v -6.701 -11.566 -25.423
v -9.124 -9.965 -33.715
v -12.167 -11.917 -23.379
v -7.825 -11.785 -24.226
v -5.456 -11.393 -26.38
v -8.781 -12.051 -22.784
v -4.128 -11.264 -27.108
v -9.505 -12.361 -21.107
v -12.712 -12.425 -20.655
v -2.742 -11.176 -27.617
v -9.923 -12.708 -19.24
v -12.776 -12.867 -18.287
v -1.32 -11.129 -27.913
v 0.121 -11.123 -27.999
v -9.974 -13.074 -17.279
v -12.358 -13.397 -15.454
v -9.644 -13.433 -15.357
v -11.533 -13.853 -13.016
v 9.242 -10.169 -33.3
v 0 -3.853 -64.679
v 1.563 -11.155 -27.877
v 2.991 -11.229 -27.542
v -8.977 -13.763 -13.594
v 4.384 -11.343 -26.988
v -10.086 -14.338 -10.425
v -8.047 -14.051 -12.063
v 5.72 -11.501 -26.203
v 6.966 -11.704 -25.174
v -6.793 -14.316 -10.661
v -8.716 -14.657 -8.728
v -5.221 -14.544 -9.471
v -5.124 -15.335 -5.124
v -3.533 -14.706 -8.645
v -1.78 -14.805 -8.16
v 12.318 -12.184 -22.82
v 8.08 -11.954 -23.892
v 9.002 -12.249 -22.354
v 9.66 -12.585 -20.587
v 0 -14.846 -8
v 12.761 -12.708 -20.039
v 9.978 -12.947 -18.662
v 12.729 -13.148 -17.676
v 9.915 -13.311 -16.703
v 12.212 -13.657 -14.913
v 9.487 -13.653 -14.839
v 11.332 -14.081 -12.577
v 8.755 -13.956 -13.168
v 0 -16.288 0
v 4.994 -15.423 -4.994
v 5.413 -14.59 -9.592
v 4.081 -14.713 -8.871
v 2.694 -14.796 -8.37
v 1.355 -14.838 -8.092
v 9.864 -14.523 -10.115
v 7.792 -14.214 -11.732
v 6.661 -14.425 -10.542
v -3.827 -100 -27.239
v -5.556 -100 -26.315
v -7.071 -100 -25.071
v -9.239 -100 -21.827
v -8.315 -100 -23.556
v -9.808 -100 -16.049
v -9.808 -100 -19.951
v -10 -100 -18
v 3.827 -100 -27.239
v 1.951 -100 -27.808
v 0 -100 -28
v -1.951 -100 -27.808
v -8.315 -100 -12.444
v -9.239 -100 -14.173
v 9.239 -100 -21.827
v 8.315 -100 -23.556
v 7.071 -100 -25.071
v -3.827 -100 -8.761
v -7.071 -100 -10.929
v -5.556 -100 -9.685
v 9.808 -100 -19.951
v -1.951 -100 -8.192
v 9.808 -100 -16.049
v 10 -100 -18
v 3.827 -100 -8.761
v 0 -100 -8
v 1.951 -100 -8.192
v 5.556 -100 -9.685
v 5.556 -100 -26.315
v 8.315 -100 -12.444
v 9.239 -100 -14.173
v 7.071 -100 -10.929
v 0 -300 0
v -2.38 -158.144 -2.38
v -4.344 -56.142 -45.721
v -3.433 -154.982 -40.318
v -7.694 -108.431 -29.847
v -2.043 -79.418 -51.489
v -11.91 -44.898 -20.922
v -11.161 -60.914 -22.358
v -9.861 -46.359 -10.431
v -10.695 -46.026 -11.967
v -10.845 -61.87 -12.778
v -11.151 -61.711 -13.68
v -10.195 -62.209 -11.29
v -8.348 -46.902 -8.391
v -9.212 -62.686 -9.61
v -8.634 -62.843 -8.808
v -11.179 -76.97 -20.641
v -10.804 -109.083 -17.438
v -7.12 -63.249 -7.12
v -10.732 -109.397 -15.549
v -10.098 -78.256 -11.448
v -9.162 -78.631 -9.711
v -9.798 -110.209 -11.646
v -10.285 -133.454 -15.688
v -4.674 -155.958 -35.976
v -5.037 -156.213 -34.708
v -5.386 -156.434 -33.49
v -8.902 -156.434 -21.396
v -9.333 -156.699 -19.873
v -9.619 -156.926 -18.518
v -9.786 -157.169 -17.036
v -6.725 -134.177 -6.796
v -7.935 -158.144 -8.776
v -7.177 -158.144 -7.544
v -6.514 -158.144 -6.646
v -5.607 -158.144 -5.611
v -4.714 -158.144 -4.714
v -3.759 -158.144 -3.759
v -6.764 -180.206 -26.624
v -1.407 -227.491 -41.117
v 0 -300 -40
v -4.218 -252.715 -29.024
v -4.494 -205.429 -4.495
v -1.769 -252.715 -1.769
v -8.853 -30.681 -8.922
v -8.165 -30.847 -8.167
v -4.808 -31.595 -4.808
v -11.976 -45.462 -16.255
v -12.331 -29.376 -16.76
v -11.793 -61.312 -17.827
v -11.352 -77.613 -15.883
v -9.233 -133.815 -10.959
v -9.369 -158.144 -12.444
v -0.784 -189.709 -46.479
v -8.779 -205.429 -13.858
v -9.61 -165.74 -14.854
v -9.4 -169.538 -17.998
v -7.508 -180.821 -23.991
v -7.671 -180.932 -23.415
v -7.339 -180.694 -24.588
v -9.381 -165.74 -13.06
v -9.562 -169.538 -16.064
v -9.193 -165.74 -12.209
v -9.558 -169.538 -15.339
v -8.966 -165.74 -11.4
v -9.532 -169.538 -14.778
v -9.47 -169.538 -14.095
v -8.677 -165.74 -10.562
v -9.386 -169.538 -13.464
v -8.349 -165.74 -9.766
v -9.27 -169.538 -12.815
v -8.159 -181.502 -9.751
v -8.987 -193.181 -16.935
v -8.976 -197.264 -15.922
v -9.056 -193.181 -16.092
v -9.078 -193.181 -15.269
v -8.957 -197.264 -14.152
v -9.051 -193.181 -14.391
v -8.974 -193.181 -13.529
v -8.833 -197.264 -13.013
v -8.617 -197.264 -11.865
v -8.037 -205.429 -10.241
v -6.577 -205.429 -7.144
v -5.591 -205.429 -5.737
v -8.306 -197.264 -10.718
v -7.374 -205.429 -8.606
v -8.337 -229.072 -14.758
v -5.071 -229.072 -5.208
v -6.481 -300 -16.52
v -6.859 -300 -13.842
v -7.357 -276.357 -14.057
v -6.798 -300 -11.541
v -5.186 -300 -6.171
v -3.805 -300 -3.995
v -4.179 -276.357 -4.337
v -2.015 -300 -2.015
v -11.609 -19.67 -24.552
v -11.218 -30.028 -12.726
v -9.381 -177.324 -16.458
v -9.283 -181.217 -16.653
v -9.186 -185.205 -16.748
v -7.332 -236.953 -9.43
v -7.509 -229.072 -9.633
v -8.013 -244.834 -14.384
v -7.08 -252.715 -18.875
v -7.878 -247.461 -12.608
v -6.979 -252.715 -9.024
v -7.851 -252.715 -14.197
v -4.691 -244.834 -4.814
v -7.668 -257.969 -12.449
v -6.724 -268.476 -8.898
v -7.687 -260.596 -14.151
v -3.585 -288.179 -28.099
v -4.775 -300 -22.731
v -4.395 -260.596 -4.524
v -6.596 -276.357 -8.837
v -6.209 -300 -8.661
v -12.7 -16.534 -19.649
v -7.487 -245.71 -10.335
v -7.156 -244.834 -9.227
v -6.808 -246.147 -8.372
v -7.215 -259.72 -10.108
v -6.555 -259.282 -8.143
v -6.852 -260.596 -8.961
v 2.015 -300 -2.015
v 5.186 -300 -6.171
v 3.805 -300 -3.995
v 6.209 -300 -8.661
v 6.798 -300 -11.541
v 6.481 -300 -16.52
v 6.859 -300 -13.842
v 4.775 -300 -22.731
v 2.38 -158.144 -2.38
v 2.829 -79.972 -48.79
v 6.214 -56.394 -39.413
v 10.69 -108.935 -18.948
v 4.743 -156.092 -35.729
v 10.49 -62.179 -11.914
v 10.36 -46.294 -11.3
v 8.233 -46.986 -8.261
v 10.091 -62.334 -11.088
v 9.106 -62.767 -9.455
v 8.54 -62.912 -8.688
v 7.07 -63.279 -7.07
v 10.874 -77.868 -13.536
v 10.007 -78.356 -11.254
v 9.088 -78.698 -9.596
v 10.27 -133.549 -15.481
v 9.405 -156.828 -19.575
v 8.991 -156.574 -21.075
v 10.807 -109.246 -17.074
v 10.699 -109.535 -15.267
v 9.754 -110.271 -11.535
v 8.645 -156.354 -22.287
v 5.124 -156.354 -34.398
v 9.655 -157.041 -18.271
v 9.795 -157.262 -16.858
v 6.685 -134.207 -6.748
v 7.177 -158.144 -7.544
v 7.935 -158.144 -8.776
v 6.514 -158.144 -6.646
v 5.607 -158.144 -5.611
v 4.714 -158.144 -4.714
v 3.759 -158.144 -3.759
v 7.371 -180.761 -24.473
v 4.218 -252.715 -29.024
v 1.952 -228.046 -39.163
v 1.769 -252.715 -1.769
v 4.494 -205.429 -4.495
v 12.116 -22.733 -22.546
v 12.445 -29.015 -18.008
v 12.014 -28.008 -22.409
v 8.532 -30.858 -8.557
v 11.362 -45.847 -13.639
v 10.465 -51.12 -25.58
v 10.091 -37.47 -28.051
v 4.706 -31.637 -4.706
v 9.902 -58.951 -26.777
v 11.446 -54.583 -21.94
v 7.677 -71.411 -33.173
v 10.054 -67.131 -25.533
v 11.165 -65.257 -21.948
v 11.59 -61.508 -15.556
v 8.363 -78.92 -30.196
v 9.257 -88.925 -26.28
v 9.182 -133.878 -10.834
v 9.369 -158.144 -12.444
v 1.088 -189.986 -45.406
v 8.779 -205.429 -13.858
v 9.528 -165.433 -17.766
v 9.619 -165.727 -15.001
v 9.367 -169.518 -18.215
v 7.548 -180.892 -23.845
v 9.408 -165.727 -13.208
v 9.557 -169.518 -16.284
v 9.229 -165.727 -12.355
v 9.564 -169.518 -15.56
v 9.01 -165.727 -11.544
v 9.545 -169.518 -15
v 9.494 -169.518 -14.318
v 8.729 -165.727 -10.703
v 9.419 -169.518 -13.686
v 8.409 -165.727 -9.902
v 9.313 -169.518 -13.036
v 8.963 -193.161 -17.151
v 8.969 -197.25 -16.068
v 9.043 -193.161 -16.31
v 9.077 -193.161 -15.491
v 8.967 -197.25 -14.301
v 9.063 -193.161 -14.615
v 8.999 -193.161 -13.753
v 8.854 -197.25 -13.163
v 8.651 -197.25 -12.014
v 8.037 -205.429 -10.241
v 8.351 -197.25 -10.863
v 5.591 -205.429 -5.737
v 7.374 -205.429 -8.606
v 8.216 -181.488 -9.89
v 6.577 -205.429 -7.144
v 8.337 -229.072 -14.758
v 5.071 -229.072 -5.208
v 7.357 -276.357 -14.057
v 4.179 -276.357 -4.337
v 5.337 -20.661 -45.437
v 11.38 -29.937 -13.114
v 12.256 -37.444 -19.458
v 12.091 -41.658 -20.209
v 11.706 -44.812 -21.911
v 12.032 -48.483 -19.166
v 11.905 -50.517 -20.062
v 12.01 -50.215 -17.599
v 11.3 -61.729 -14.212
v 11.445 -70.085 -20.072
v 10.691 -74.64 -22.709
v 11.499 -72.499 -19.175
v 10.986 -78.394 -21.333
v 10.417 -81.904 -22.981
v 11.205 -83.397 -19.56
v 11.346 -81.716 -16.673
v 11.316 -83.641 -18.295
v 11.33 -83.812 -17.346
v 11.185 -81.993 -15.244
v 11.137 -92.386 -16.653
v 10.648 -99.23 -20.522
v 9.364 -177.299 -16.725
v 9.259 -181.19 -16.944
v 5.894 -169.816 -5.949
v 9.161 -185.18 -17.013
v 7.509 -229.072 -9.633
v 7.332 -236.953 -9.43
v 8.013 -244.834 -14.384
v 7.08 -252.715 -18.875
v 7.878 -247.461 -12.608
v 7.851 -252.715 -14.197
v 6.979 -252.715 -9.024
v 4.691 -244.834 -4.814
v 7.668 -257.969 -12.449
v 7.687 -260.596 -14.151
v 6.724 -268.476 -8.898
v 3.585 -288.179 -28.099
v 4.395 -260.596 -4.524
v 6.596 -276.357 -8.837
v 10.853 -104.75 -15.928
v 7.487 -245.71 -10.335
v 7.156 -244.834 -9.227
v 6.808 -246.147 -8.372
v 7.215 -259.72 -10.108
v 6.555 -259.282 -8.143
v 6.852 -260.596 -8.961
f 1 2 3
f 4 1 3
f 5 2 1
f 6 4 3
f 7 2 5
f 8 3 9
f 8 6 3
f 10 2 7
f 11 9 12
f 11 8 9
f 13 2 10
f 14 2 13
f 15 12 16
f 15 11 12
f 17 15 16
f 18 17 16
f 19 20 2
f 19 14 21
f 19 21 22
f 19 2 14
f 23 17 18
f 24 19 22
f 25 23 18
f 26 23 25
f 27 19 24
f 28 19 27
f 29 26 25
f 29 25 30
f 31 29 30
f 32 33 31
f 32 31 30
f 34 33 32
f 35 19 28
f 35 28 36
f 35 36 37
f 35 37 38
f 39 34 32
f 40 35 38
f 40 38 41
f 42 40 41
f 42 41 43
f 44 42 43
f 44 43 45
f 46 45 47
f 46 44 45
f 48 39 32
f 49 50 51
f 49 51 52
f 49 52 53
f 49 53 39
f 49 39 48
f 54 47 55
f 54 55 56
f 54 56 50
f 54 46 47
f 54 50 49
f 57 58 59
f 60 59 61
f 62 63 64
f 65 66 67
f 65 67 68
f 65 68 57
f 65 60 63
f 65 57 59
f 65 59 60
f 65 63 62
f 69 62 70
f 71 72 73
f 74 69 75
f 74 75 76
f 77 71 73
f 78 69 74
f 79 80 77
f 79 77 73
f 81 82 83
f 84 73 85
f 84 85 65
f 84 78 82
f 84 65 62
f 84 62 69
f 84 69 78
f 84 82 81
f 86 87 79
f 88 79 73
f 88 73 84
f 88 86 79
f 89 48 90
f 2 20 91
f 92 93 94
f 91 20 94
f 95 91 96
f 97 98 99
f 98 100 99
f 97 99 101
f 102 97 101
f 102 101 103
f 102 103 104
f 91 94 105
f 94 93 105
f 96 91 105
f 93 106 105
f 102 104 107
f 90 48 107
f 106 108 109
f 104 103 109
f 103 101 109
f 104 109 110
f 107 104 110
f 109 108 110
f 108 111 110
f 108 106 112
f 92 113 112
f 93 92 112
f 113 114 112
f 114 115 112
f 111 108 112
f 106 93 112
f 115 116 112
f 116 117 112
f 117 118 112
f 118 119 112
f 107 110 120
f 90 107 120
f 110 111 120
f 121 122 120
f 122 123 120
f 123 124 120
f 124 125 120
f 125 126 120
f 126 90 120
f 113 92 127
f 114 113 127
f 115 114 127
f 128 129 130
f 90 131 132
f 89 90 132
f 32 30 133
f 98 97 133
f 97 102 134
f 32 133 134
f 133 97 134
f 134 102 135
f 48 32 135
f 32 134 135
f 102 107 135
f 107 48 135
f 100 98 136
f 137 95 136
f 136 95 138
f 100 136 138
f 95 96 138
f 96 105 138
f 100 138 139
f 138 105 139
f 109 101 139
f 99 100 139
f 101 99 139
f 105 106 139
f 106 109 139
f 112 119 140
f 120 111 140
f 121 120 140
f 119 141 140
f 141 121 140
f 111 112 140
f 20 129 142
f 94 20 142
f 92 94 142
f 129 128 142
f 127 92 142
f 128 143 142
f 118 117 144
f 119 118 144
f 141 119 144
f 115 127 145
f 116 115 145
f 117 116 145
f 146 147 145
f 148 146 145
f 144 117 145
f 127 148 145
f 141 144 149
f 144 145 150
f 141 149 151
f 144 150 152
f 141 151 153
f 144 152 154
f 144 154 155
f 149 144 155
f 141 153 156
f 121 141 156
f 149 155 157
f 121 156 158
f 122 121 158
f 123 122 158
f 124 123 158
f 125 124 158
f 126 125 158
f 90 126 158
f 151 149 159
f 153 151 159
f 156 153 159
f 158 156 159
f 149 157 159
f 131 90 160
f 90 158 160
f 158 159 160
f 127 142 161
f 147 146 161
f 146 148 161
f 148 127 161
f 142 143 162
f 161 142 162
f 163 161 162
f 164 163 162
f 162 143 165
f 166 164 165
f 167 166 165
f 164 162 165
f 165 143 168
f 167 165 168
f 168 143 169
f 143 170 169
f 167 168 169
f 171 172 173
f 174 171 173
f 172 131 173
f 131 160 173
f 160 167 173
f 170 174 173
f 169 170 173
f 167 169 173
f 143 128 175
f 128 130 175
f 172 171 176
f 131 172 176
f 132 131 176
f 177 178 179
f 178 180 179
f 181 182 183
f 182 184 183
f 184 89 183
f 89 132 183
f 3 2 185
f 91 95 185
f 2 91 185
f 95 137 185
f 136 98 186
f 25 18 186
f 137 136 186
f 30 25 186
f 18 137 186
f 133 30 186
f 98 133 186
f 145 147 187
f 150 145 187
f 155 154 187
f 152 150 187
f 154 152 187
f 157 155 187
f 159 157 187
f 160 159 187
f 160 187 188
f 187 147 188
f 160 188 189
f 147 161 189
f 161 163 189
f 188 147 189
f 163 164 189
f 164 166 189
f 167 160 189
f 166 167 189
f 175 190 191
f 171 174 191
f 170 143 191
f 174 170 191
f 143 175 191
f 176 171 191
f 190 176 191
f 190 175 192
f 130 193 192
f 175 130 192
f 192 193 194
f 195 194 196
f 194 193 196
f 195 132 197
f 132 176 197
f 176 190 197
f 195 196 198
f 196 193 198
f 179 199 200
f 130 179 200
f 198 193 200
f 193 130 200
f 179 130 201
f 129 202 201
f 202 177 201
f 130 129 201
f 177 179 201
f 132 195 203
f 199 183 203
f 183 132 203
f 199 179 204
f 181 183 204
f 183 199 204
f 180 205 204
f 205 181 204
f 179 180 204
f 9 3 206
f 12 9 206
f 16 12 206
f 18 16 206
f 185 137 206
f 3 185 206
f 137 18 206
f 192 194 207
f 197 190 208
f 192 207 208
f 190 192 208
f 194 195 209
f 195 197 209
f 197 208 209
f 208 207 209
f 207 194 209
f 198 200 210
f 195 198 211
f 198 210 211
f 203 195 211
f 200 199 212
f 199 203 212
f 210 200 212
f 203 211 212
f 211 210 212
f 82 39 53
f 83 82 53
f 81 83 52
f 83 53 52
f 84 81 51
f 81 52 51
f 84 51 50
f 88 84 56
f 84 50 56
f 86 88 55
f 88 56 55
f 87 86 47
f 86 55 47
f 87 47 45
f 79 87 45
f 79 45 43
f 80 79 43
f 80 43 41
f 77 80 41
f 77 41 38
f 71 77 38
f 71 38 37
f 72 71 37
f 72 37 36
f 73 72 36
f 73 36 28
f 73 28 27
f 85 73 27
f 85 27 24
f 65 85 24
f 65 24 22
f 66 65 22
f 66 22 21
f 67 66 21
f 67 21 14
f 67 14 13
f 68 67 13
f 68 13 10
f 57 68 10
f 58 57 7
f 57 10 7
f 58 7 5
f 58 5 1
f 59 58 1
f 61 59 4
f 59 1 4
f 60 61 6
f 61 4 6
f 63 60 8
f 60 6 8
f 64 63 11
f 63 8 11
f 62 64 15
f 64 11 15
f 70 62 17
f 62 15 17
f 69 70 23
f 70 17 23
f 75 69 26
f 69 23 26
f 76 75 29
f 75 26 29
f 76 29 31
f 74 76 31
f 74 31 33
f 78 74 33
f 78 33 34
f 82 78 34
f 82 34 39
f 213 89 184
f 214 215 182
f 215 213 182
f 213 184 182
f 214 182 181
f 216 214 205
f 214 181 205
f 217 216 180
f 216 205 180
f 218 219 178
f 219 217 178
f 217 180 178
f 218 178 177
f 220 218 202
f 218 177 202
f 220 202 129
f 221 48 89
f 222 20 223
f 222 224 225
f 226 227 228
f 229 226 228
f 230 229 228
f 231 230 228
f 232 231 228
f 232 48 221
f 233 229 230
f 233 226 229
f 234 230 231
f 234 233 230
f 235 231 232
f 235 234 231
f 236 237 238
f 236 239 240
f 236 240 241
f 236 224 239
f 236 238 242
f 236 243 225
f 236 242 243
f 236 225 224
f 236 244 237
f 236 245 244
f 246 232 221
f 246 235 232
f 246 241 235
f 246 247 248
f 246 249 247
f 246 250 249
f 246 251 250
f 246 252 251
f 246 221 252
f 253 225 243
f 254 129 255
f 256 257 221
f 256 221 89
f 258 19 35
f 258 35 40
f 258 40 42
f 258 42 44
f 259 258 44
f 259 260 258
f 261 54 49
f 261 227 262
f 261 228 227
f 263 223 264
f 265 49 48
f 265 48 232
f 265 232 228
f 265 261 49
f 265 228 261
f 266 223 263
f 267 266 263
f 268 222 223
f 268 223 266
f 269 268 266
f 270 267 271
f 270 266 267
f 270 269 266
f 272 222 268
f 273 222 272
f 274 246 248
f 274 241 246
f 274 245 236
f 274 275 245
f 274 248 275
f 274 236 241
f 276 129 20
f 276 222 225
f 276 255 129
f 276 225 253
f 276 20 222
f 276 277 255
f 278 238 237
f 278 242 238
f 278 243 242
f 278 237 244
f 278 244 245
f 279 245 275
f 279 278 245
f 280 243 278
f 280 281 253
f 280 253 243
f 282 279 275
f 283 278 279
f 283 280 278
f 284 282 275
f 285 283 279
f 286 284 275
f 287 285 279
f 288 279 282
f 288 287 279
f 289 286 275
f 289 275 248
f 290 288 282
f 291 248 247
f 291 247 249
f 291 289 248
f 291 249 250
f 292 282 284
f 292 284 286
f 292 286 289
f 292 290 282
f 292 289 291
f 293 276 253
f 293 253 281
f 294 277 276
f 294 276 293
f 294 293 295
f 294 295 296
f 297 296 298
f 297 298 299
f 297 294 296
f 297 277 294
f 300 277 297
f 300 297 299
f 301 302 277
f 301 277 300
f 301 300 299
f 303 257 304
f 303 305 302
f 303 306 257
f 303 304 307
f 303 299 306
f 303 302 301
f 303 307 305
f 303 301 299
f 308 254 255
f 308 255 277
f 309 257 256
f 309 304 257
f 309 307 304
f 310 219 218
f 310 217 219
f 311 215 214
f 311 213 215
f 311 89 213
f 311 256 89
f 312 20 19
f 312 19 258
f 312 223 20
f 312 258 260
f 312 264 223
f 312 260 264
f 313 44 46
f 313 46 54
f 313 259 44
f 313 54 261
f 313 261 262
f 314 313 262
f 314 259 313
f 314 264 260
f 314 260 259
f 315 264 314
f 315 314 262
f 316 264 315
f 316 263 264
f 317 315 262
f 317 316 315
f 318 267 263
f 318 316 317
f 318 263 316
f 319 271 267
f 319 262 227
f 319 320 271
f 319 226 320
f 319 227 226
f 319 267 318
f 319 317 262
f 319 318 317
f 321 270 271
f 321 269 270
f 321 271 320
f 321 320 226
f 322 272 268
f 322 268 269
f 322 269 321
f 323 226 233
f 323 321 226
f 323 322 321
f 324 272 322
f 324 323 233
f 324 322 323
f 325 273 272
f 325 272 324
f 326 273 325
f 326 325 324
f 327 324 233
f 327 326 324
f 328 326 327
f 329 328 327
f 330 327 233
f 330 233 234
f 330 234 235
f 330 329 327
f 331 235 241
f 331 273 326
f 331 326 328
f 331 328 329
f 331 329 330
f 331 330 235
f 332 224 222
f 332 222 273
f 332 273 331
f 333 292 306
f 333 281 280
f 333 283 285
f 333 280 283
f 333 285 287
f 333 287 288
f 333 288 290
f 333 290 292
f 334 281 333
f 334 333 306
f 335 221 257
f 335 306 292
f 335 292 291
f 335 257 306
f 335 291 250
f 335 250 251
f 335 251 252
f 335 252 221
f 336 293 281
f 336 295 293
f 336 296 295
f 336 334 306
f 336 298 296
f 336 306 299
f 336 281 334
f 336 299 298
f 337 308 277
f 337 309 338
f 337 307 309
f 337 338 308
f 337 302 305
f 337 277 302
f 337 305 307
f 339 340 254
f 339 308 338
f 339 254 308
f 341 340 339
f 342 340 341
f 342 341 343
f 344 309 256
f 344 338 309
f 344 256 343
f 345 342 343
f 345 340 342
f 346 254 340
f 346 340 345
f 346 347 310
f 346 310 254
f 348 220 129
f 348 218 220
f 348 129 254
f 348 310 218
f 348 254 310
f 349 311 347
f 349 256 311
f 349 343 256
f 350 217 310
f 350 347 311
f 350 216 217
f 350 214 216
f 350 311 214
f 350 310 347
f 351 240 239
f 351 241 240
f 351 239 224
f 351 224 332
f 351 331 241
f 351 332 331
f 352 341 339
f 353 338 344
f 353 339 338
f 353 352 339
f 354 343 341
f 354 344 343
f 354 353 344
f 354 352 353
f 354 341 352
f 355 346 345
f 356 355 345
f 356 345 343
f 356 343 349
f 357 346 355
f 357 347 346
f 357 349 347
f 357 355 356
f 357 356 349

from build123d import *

# Parameters (mm, degrees)
POST_HOLE_R             = 10
CUT_EXTRUDE1_DEPTH      = 100
CUT_EXTRUDE2_DEPTH      = 244.732583295
CUT_EXTRUDE2_DEPTH_BACK = 244.732583295


with BuildPart() as part:
    # Loft1: read off the stored shape, not the designer's step
    # Loft1: loft between two sections, ruled curve by curve
    loft1_from = [
        Edge.make_bspline([(0, 0, -65), (1.090128751, 0, -61.366237497), (3.270747147, 0, -54.097509509), (6.471517091, 0, -43.428276362), (9.544840896, 0, -33.183863681), (11.485081194, 0, -26.716396019), (12.666432162, 0, -22.77855946), (12.968402106, 0, -21.305053815), (13.100609282, 0, -19.286967133), (12.978325762, 0, -17.392629287), (12.635490493, 0, -15.578921438), (12.073950502, 0, -13.82193497), (11.281547245, 0, -12.101334039), (10.209994947, 0, -10.396029742), (9.25103095, 0, -9.25103095), (8.163446408, 0, -8.163446408), (7.044301694, 0, -7.044301694), (4.665334779, 0, -4.665334779), (1.934160234, 0, -1.934160234), (0.587535045, 0, -0.587535045), (0, 0, 0)], [0, 0, 0, 0, 0.144398069, 0.288796138, 0.433194208, 0.577592277, 0.577592277, 0.614580384, 0.651568491, 0.688556598, 0.725544706, 0.762532813, 0.79952092, 0.836509027, 0.873497134, 0.873497134, 0.905122851, 0.936748567, 0.968374284, 1, 1, 1, 1], 3),
        Edge.make_line((0, 0, -65), (0, 0, 0)),
    ]
    loft1_to = [
        Edge.make_bspline([(0, -300, -40), (0.497105388, -300, -38.202262552), (1.498303235, -300, -34.581519535), (3.037083349, -300, -29.016658037), (4.633229436, -300, -23.244337598), (5.753794564, -300, -19.191913419), (6.484300851, -300, -16.550102367), (6.736474062, -300, -15.404380913), (6.917285676, -300, -13.486434812), (6.834511282, -300, -11.412388499), (6.44022099, -300, -9.278535319), (5.736721859, -300, -7.220345405), (4.785310579, -300, -5.360639369), (3.675318905, -300, -3.765229265), (2.883667943, -300, -2.883667943), (2.143164712, -300, -2.143164712), (1.762545696, -300, -1.762545696), (1.206796855, -300, -1.206796855), (0.680514831, -300, -0.680514831), (0.288861433, -300, -0.288861433), (0, -300, 0)], [0, 0, 0, 0, 0.144398069, 0.288796138, 0.433194208, 0.577592277, 0.577592277, 0.614580384, 0.651568491, 0.688556598, 0.725544706, 0.762532813, 0.79952092, 0.836509027, 0.873497134, 0.873497134, 0.905122851, 0.936748567, 0.968374284, 1, 1, 1, 1], 3),
        Edge.make_line((0, -300, -40), (0, -300, 0)),
    ]
    loft1 = Solid(Shell([*[Face.make_surface_from_curves(loft1_from[k], loft1_to[k]) for k in range(2)], Face(Wire(loft1_from)), Face(Wire(loft1_to))]))
    add(loft1)

    # Mirror1: Loft1 across plane
    add(loft1.mirror(Plane.ZY))

    # post_hole → Cut-Extrude1 (cut)
    with BuildSketch(Plane(origin=(0, 0, 0), x_dir=(1, 0, 0), z_dir=(0, 1, 0))):
        with Locations(Location((0, 18, 0), (0, 0, 270))):
            Circle(POST_HOLE_R)
    extrude(amount=-CUT_EXTRUDE1_DEPTH, mode=Mode.SUBTRACT)

    # Sketch1 → Cut-Extrude2 (cut, two sides: drawn at the far end of the back side and taken through both)
    with BuildSketch(Plane(origin=(-1.395234412, -236.356805311, -57.724602067), x_dir=(0.03510103444042518, 0, 0.9993837688201725), z_dir=(-0.9993837688201725, 0, 0.03510103444042518)).offset(-CUT_EXTRUDE2_DEPTH_BACK)):
        with BuildLine():
            Line((-6.901046872, 232.503708167), (-7.221940435, 236.356805311))
            Line((-7.221940435, 236.356805311), (34.607125692, 236.356805311))
            Line((34.607125692, 236.356805311), (49.382745775, 236.356805311))
            Line((49.382745775, 236.356805311), (57.738004539, 236.356805311))
            Line((57.738004539, 236.356805311), (57.738004539, 220.068385372))
            add(Edge.make_bspline(
                [(-6.901046872, 232.503708167), (14.59060476, 228.075000406), (36.140920736, 223.929205599), (57.738004539, 220.068385372)],
                knots=[0.014685246, 0.014685246, 0.014685246, 0.014685246, 0.066243156, 0.066243156, 0.066243156, 0.066243156], degree=3))
        make_face()
    extrude(amount=CUT_EXTRUDE2_DEPTH + CUT_EXTRUDE2_DEPTH_BACK, mode=Mode.SUBTRACT)


solid = part.part
